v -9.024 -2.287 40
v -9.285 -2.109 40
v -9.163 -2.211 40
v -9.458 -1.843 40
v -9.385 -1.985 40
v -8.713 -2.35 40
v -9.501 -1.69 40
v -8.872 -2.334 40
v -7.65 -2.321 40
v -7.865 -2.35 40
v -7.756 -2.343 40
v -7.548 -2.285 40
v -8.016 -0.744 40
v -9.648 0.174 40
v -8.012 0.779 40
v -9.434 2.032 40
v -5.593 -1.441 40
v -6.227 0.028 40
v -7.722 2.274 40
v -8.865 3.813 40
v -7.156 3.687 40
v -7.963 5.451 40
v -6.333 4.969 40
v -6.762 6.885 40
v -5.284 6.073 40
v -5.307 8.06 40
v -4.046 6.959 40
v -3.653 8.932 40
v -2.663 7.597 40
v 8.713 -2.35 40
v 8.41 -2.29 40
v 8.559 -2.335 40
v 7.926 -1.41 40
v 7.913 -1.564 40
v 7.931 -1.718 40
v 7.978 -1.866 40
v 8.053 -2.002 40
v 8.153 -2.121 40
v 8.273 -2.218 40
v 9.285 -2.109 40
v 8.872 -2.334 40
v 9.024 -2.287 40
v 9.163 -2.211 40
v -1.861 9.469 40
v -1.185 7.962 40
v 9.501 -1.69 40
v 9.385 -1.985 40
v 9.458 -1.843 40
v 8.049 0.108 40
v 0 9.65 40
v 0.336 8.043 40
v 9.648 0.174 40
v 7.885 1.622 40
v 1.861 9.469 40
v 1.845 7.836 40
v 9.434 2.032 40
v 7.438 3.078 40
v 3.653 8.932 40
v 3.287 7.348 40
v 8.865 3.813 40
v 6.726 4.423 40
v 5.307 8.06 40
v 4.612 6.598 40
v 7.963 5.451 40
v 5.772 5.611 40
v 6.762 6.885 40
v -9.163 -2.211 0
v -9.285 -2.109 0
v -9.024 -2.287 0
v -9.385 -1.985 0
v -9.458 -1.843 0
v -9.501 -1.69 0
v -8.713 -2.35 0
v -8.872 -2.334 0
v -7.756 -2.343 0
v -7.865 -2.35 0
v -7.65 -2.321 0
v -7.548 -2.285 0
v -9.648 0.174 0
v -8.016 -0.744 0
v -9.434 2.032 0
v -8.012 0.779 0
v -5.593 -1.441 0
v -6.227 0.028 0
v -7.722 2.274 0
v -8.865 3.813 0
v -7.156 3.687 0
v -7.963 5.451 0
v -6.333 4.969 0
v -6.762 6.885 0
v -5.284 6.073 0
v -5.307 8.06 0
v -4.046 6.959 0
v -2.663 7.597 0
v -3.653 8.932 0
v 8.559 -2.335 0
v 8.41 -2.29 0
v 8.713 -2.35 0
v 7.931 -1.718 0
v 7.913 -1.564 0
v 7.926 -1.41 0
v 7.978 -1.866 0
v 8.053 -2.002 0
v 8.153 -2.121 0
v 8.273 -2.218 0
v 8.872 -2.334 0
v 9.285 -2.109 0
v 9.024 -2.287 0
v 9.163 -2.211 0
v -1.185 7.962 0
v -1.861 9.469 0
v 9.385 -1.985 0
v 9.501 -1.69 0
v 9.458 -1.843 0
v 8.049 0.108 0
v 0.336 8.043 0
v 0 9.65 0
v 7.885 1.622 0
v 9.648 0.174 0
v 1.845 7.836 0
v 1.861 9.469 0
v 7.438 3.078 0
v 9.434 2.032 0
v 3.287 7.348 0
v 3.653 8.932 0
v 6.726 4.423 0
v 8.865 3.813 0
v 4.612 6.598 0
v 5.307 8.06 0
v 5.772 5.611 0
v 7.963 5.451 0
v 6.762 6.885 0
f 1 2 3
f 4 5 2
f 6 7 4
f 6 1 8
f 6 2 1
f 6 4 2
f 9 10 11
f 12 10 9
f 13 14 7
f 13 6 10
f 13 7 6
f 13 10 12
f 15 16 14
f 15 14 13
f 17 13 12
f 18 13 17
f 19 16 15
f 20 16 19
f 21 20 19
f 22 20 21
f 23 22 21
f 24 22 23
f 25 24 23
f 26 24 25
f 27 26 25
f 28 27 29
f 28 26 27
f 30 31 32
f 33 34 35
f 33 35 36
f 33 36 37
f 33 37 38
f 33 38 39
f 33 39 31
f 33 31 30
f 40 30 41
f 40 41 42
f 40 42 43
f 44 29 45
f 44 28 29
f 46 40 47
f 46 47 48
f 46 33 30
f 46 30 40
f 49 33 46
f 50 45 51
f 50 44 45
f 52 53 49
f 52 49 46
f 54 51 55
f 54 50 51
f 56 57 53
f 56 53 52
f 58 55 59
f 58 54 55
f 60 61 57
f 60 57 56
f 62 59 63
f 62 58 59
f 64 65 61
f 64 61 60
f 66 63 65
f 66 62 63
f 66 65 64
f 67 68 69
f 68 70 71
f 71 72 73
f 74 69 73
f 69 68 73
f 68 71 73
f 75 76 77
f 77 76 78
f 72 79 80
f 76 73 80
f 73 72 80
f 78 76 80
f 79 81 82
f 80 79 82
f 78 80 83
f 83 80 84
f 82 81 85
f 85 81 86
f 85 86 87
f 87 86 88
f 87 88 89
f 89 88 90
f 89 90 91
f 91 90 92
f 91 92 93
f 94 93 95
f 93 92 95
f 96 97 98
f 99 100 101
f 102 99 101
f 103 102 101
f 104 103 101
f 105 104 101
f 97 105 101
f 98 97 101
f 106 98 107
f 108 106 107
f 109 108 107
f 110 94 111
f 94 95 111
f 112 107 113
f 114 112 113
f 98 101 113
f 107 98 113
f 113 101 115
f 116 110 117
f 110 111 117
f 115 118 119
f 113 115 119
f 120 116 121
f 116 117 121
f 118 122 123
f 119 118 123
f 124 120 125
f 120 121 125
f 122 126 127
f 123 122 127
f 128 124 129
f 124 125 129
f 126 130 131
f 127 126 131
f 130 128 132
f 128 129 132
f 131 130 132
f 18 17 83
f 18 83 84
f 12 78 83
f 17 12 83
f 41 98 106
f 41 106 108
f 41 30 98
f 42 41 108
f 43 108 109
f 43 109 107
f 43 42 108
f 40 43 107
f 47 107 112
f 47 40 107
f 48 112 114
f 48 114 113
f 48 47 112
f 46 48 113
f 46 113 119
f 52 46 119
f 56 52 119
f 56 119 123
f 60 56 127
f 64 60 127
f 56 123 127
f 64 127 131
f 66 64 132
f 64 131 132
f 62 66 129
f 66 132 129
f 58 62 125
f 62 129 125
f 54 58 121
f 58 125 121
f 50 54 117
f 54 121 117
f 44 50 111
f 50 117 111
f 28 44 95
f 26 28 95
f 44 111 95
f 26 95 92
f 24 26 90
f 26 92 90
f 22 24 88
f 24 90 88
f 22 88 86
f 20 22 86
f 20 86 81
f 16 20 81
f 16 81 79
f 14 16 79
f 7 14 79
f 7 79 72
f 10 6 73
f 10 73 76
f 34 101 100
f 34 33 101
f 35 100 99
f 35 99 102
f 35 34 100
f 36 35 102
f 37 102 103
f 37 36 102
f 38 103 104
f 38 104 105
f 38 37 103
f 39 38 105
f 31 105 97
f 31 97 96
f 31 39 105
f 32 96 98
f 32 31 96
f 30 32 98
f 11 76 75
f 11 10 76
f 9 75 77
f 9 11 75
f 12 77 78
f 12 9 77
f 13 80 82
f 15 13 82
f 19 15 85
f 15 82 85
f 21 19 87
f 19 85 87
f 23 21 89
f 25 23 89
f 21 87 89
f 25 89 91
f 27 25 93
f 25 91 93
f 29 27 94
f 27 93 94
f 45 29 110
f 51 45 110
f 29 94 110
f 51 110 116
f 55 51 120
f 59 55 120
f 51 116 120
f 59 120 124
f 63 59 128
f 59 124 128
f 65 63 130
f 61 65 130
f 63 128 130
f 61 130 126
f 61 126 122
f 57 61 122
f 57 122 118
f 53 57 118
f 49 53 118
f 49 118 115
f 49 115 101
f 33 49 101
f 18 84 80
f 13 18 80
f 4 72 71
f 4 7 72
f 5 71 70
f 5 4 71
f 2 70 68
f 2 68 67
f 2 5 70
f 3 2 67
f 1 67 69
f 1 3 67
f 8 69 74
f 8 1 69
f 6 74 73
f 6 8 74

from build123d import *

# Parameters (mm, degrees)
F1_DEPTH = 40
F2_R     = 0.79999


# Not quite as in the source:
# - a fillet or chamfer is up to 0.001 mm smaller than in the source, because OpenCascade refuses the exact size


with BuildPart() as f1:
    # F0 (on Top) → F1 (new body)
    with BuildSketch(Plane.XY):
        with BuildLine():
            ThreePointArc((-8.0155554774, -0.7438886939), (0.8184709888, 8.008283539), (7.699350622, -2.35))
            Line((7.699350622, -2.35), (9.3594871654, -2.35))
            ThreePointArc((9.3594871654, -2.35), (0, 9.65), (-9.3594871654, -2.35))
            Line((-9.3594871654, -2.35), (-7.699350622, -2.35))
            Line((-7.699350622, -2.35), (-5.5929206907, -1.4413775962))
            Line((-5.5929206907, -1.4413775962), (-6.2266466845, 0.0277688788))
            Line((-6.2266466845, 0.0277688788), (-8.0155554774, -0.7438886939))
        make_face()
    extrude(amount=F1_DEPTH)

    # F2 (radius 0.8 in the source; OpenCascade refuses exactly that, so slightly less here)
    f2_edges = [f1.edges().sort_by_distance(p)[0] for p in [
        (-7.699351, -2.35, 20),
        (7.699351, -2.35, 20),
        (9.359487, -2.35, 20),
        (-9.359487, -2.35, 20),
    ]]
    fillet(f2_edges, radius=F2_R)


solid = f1.part
